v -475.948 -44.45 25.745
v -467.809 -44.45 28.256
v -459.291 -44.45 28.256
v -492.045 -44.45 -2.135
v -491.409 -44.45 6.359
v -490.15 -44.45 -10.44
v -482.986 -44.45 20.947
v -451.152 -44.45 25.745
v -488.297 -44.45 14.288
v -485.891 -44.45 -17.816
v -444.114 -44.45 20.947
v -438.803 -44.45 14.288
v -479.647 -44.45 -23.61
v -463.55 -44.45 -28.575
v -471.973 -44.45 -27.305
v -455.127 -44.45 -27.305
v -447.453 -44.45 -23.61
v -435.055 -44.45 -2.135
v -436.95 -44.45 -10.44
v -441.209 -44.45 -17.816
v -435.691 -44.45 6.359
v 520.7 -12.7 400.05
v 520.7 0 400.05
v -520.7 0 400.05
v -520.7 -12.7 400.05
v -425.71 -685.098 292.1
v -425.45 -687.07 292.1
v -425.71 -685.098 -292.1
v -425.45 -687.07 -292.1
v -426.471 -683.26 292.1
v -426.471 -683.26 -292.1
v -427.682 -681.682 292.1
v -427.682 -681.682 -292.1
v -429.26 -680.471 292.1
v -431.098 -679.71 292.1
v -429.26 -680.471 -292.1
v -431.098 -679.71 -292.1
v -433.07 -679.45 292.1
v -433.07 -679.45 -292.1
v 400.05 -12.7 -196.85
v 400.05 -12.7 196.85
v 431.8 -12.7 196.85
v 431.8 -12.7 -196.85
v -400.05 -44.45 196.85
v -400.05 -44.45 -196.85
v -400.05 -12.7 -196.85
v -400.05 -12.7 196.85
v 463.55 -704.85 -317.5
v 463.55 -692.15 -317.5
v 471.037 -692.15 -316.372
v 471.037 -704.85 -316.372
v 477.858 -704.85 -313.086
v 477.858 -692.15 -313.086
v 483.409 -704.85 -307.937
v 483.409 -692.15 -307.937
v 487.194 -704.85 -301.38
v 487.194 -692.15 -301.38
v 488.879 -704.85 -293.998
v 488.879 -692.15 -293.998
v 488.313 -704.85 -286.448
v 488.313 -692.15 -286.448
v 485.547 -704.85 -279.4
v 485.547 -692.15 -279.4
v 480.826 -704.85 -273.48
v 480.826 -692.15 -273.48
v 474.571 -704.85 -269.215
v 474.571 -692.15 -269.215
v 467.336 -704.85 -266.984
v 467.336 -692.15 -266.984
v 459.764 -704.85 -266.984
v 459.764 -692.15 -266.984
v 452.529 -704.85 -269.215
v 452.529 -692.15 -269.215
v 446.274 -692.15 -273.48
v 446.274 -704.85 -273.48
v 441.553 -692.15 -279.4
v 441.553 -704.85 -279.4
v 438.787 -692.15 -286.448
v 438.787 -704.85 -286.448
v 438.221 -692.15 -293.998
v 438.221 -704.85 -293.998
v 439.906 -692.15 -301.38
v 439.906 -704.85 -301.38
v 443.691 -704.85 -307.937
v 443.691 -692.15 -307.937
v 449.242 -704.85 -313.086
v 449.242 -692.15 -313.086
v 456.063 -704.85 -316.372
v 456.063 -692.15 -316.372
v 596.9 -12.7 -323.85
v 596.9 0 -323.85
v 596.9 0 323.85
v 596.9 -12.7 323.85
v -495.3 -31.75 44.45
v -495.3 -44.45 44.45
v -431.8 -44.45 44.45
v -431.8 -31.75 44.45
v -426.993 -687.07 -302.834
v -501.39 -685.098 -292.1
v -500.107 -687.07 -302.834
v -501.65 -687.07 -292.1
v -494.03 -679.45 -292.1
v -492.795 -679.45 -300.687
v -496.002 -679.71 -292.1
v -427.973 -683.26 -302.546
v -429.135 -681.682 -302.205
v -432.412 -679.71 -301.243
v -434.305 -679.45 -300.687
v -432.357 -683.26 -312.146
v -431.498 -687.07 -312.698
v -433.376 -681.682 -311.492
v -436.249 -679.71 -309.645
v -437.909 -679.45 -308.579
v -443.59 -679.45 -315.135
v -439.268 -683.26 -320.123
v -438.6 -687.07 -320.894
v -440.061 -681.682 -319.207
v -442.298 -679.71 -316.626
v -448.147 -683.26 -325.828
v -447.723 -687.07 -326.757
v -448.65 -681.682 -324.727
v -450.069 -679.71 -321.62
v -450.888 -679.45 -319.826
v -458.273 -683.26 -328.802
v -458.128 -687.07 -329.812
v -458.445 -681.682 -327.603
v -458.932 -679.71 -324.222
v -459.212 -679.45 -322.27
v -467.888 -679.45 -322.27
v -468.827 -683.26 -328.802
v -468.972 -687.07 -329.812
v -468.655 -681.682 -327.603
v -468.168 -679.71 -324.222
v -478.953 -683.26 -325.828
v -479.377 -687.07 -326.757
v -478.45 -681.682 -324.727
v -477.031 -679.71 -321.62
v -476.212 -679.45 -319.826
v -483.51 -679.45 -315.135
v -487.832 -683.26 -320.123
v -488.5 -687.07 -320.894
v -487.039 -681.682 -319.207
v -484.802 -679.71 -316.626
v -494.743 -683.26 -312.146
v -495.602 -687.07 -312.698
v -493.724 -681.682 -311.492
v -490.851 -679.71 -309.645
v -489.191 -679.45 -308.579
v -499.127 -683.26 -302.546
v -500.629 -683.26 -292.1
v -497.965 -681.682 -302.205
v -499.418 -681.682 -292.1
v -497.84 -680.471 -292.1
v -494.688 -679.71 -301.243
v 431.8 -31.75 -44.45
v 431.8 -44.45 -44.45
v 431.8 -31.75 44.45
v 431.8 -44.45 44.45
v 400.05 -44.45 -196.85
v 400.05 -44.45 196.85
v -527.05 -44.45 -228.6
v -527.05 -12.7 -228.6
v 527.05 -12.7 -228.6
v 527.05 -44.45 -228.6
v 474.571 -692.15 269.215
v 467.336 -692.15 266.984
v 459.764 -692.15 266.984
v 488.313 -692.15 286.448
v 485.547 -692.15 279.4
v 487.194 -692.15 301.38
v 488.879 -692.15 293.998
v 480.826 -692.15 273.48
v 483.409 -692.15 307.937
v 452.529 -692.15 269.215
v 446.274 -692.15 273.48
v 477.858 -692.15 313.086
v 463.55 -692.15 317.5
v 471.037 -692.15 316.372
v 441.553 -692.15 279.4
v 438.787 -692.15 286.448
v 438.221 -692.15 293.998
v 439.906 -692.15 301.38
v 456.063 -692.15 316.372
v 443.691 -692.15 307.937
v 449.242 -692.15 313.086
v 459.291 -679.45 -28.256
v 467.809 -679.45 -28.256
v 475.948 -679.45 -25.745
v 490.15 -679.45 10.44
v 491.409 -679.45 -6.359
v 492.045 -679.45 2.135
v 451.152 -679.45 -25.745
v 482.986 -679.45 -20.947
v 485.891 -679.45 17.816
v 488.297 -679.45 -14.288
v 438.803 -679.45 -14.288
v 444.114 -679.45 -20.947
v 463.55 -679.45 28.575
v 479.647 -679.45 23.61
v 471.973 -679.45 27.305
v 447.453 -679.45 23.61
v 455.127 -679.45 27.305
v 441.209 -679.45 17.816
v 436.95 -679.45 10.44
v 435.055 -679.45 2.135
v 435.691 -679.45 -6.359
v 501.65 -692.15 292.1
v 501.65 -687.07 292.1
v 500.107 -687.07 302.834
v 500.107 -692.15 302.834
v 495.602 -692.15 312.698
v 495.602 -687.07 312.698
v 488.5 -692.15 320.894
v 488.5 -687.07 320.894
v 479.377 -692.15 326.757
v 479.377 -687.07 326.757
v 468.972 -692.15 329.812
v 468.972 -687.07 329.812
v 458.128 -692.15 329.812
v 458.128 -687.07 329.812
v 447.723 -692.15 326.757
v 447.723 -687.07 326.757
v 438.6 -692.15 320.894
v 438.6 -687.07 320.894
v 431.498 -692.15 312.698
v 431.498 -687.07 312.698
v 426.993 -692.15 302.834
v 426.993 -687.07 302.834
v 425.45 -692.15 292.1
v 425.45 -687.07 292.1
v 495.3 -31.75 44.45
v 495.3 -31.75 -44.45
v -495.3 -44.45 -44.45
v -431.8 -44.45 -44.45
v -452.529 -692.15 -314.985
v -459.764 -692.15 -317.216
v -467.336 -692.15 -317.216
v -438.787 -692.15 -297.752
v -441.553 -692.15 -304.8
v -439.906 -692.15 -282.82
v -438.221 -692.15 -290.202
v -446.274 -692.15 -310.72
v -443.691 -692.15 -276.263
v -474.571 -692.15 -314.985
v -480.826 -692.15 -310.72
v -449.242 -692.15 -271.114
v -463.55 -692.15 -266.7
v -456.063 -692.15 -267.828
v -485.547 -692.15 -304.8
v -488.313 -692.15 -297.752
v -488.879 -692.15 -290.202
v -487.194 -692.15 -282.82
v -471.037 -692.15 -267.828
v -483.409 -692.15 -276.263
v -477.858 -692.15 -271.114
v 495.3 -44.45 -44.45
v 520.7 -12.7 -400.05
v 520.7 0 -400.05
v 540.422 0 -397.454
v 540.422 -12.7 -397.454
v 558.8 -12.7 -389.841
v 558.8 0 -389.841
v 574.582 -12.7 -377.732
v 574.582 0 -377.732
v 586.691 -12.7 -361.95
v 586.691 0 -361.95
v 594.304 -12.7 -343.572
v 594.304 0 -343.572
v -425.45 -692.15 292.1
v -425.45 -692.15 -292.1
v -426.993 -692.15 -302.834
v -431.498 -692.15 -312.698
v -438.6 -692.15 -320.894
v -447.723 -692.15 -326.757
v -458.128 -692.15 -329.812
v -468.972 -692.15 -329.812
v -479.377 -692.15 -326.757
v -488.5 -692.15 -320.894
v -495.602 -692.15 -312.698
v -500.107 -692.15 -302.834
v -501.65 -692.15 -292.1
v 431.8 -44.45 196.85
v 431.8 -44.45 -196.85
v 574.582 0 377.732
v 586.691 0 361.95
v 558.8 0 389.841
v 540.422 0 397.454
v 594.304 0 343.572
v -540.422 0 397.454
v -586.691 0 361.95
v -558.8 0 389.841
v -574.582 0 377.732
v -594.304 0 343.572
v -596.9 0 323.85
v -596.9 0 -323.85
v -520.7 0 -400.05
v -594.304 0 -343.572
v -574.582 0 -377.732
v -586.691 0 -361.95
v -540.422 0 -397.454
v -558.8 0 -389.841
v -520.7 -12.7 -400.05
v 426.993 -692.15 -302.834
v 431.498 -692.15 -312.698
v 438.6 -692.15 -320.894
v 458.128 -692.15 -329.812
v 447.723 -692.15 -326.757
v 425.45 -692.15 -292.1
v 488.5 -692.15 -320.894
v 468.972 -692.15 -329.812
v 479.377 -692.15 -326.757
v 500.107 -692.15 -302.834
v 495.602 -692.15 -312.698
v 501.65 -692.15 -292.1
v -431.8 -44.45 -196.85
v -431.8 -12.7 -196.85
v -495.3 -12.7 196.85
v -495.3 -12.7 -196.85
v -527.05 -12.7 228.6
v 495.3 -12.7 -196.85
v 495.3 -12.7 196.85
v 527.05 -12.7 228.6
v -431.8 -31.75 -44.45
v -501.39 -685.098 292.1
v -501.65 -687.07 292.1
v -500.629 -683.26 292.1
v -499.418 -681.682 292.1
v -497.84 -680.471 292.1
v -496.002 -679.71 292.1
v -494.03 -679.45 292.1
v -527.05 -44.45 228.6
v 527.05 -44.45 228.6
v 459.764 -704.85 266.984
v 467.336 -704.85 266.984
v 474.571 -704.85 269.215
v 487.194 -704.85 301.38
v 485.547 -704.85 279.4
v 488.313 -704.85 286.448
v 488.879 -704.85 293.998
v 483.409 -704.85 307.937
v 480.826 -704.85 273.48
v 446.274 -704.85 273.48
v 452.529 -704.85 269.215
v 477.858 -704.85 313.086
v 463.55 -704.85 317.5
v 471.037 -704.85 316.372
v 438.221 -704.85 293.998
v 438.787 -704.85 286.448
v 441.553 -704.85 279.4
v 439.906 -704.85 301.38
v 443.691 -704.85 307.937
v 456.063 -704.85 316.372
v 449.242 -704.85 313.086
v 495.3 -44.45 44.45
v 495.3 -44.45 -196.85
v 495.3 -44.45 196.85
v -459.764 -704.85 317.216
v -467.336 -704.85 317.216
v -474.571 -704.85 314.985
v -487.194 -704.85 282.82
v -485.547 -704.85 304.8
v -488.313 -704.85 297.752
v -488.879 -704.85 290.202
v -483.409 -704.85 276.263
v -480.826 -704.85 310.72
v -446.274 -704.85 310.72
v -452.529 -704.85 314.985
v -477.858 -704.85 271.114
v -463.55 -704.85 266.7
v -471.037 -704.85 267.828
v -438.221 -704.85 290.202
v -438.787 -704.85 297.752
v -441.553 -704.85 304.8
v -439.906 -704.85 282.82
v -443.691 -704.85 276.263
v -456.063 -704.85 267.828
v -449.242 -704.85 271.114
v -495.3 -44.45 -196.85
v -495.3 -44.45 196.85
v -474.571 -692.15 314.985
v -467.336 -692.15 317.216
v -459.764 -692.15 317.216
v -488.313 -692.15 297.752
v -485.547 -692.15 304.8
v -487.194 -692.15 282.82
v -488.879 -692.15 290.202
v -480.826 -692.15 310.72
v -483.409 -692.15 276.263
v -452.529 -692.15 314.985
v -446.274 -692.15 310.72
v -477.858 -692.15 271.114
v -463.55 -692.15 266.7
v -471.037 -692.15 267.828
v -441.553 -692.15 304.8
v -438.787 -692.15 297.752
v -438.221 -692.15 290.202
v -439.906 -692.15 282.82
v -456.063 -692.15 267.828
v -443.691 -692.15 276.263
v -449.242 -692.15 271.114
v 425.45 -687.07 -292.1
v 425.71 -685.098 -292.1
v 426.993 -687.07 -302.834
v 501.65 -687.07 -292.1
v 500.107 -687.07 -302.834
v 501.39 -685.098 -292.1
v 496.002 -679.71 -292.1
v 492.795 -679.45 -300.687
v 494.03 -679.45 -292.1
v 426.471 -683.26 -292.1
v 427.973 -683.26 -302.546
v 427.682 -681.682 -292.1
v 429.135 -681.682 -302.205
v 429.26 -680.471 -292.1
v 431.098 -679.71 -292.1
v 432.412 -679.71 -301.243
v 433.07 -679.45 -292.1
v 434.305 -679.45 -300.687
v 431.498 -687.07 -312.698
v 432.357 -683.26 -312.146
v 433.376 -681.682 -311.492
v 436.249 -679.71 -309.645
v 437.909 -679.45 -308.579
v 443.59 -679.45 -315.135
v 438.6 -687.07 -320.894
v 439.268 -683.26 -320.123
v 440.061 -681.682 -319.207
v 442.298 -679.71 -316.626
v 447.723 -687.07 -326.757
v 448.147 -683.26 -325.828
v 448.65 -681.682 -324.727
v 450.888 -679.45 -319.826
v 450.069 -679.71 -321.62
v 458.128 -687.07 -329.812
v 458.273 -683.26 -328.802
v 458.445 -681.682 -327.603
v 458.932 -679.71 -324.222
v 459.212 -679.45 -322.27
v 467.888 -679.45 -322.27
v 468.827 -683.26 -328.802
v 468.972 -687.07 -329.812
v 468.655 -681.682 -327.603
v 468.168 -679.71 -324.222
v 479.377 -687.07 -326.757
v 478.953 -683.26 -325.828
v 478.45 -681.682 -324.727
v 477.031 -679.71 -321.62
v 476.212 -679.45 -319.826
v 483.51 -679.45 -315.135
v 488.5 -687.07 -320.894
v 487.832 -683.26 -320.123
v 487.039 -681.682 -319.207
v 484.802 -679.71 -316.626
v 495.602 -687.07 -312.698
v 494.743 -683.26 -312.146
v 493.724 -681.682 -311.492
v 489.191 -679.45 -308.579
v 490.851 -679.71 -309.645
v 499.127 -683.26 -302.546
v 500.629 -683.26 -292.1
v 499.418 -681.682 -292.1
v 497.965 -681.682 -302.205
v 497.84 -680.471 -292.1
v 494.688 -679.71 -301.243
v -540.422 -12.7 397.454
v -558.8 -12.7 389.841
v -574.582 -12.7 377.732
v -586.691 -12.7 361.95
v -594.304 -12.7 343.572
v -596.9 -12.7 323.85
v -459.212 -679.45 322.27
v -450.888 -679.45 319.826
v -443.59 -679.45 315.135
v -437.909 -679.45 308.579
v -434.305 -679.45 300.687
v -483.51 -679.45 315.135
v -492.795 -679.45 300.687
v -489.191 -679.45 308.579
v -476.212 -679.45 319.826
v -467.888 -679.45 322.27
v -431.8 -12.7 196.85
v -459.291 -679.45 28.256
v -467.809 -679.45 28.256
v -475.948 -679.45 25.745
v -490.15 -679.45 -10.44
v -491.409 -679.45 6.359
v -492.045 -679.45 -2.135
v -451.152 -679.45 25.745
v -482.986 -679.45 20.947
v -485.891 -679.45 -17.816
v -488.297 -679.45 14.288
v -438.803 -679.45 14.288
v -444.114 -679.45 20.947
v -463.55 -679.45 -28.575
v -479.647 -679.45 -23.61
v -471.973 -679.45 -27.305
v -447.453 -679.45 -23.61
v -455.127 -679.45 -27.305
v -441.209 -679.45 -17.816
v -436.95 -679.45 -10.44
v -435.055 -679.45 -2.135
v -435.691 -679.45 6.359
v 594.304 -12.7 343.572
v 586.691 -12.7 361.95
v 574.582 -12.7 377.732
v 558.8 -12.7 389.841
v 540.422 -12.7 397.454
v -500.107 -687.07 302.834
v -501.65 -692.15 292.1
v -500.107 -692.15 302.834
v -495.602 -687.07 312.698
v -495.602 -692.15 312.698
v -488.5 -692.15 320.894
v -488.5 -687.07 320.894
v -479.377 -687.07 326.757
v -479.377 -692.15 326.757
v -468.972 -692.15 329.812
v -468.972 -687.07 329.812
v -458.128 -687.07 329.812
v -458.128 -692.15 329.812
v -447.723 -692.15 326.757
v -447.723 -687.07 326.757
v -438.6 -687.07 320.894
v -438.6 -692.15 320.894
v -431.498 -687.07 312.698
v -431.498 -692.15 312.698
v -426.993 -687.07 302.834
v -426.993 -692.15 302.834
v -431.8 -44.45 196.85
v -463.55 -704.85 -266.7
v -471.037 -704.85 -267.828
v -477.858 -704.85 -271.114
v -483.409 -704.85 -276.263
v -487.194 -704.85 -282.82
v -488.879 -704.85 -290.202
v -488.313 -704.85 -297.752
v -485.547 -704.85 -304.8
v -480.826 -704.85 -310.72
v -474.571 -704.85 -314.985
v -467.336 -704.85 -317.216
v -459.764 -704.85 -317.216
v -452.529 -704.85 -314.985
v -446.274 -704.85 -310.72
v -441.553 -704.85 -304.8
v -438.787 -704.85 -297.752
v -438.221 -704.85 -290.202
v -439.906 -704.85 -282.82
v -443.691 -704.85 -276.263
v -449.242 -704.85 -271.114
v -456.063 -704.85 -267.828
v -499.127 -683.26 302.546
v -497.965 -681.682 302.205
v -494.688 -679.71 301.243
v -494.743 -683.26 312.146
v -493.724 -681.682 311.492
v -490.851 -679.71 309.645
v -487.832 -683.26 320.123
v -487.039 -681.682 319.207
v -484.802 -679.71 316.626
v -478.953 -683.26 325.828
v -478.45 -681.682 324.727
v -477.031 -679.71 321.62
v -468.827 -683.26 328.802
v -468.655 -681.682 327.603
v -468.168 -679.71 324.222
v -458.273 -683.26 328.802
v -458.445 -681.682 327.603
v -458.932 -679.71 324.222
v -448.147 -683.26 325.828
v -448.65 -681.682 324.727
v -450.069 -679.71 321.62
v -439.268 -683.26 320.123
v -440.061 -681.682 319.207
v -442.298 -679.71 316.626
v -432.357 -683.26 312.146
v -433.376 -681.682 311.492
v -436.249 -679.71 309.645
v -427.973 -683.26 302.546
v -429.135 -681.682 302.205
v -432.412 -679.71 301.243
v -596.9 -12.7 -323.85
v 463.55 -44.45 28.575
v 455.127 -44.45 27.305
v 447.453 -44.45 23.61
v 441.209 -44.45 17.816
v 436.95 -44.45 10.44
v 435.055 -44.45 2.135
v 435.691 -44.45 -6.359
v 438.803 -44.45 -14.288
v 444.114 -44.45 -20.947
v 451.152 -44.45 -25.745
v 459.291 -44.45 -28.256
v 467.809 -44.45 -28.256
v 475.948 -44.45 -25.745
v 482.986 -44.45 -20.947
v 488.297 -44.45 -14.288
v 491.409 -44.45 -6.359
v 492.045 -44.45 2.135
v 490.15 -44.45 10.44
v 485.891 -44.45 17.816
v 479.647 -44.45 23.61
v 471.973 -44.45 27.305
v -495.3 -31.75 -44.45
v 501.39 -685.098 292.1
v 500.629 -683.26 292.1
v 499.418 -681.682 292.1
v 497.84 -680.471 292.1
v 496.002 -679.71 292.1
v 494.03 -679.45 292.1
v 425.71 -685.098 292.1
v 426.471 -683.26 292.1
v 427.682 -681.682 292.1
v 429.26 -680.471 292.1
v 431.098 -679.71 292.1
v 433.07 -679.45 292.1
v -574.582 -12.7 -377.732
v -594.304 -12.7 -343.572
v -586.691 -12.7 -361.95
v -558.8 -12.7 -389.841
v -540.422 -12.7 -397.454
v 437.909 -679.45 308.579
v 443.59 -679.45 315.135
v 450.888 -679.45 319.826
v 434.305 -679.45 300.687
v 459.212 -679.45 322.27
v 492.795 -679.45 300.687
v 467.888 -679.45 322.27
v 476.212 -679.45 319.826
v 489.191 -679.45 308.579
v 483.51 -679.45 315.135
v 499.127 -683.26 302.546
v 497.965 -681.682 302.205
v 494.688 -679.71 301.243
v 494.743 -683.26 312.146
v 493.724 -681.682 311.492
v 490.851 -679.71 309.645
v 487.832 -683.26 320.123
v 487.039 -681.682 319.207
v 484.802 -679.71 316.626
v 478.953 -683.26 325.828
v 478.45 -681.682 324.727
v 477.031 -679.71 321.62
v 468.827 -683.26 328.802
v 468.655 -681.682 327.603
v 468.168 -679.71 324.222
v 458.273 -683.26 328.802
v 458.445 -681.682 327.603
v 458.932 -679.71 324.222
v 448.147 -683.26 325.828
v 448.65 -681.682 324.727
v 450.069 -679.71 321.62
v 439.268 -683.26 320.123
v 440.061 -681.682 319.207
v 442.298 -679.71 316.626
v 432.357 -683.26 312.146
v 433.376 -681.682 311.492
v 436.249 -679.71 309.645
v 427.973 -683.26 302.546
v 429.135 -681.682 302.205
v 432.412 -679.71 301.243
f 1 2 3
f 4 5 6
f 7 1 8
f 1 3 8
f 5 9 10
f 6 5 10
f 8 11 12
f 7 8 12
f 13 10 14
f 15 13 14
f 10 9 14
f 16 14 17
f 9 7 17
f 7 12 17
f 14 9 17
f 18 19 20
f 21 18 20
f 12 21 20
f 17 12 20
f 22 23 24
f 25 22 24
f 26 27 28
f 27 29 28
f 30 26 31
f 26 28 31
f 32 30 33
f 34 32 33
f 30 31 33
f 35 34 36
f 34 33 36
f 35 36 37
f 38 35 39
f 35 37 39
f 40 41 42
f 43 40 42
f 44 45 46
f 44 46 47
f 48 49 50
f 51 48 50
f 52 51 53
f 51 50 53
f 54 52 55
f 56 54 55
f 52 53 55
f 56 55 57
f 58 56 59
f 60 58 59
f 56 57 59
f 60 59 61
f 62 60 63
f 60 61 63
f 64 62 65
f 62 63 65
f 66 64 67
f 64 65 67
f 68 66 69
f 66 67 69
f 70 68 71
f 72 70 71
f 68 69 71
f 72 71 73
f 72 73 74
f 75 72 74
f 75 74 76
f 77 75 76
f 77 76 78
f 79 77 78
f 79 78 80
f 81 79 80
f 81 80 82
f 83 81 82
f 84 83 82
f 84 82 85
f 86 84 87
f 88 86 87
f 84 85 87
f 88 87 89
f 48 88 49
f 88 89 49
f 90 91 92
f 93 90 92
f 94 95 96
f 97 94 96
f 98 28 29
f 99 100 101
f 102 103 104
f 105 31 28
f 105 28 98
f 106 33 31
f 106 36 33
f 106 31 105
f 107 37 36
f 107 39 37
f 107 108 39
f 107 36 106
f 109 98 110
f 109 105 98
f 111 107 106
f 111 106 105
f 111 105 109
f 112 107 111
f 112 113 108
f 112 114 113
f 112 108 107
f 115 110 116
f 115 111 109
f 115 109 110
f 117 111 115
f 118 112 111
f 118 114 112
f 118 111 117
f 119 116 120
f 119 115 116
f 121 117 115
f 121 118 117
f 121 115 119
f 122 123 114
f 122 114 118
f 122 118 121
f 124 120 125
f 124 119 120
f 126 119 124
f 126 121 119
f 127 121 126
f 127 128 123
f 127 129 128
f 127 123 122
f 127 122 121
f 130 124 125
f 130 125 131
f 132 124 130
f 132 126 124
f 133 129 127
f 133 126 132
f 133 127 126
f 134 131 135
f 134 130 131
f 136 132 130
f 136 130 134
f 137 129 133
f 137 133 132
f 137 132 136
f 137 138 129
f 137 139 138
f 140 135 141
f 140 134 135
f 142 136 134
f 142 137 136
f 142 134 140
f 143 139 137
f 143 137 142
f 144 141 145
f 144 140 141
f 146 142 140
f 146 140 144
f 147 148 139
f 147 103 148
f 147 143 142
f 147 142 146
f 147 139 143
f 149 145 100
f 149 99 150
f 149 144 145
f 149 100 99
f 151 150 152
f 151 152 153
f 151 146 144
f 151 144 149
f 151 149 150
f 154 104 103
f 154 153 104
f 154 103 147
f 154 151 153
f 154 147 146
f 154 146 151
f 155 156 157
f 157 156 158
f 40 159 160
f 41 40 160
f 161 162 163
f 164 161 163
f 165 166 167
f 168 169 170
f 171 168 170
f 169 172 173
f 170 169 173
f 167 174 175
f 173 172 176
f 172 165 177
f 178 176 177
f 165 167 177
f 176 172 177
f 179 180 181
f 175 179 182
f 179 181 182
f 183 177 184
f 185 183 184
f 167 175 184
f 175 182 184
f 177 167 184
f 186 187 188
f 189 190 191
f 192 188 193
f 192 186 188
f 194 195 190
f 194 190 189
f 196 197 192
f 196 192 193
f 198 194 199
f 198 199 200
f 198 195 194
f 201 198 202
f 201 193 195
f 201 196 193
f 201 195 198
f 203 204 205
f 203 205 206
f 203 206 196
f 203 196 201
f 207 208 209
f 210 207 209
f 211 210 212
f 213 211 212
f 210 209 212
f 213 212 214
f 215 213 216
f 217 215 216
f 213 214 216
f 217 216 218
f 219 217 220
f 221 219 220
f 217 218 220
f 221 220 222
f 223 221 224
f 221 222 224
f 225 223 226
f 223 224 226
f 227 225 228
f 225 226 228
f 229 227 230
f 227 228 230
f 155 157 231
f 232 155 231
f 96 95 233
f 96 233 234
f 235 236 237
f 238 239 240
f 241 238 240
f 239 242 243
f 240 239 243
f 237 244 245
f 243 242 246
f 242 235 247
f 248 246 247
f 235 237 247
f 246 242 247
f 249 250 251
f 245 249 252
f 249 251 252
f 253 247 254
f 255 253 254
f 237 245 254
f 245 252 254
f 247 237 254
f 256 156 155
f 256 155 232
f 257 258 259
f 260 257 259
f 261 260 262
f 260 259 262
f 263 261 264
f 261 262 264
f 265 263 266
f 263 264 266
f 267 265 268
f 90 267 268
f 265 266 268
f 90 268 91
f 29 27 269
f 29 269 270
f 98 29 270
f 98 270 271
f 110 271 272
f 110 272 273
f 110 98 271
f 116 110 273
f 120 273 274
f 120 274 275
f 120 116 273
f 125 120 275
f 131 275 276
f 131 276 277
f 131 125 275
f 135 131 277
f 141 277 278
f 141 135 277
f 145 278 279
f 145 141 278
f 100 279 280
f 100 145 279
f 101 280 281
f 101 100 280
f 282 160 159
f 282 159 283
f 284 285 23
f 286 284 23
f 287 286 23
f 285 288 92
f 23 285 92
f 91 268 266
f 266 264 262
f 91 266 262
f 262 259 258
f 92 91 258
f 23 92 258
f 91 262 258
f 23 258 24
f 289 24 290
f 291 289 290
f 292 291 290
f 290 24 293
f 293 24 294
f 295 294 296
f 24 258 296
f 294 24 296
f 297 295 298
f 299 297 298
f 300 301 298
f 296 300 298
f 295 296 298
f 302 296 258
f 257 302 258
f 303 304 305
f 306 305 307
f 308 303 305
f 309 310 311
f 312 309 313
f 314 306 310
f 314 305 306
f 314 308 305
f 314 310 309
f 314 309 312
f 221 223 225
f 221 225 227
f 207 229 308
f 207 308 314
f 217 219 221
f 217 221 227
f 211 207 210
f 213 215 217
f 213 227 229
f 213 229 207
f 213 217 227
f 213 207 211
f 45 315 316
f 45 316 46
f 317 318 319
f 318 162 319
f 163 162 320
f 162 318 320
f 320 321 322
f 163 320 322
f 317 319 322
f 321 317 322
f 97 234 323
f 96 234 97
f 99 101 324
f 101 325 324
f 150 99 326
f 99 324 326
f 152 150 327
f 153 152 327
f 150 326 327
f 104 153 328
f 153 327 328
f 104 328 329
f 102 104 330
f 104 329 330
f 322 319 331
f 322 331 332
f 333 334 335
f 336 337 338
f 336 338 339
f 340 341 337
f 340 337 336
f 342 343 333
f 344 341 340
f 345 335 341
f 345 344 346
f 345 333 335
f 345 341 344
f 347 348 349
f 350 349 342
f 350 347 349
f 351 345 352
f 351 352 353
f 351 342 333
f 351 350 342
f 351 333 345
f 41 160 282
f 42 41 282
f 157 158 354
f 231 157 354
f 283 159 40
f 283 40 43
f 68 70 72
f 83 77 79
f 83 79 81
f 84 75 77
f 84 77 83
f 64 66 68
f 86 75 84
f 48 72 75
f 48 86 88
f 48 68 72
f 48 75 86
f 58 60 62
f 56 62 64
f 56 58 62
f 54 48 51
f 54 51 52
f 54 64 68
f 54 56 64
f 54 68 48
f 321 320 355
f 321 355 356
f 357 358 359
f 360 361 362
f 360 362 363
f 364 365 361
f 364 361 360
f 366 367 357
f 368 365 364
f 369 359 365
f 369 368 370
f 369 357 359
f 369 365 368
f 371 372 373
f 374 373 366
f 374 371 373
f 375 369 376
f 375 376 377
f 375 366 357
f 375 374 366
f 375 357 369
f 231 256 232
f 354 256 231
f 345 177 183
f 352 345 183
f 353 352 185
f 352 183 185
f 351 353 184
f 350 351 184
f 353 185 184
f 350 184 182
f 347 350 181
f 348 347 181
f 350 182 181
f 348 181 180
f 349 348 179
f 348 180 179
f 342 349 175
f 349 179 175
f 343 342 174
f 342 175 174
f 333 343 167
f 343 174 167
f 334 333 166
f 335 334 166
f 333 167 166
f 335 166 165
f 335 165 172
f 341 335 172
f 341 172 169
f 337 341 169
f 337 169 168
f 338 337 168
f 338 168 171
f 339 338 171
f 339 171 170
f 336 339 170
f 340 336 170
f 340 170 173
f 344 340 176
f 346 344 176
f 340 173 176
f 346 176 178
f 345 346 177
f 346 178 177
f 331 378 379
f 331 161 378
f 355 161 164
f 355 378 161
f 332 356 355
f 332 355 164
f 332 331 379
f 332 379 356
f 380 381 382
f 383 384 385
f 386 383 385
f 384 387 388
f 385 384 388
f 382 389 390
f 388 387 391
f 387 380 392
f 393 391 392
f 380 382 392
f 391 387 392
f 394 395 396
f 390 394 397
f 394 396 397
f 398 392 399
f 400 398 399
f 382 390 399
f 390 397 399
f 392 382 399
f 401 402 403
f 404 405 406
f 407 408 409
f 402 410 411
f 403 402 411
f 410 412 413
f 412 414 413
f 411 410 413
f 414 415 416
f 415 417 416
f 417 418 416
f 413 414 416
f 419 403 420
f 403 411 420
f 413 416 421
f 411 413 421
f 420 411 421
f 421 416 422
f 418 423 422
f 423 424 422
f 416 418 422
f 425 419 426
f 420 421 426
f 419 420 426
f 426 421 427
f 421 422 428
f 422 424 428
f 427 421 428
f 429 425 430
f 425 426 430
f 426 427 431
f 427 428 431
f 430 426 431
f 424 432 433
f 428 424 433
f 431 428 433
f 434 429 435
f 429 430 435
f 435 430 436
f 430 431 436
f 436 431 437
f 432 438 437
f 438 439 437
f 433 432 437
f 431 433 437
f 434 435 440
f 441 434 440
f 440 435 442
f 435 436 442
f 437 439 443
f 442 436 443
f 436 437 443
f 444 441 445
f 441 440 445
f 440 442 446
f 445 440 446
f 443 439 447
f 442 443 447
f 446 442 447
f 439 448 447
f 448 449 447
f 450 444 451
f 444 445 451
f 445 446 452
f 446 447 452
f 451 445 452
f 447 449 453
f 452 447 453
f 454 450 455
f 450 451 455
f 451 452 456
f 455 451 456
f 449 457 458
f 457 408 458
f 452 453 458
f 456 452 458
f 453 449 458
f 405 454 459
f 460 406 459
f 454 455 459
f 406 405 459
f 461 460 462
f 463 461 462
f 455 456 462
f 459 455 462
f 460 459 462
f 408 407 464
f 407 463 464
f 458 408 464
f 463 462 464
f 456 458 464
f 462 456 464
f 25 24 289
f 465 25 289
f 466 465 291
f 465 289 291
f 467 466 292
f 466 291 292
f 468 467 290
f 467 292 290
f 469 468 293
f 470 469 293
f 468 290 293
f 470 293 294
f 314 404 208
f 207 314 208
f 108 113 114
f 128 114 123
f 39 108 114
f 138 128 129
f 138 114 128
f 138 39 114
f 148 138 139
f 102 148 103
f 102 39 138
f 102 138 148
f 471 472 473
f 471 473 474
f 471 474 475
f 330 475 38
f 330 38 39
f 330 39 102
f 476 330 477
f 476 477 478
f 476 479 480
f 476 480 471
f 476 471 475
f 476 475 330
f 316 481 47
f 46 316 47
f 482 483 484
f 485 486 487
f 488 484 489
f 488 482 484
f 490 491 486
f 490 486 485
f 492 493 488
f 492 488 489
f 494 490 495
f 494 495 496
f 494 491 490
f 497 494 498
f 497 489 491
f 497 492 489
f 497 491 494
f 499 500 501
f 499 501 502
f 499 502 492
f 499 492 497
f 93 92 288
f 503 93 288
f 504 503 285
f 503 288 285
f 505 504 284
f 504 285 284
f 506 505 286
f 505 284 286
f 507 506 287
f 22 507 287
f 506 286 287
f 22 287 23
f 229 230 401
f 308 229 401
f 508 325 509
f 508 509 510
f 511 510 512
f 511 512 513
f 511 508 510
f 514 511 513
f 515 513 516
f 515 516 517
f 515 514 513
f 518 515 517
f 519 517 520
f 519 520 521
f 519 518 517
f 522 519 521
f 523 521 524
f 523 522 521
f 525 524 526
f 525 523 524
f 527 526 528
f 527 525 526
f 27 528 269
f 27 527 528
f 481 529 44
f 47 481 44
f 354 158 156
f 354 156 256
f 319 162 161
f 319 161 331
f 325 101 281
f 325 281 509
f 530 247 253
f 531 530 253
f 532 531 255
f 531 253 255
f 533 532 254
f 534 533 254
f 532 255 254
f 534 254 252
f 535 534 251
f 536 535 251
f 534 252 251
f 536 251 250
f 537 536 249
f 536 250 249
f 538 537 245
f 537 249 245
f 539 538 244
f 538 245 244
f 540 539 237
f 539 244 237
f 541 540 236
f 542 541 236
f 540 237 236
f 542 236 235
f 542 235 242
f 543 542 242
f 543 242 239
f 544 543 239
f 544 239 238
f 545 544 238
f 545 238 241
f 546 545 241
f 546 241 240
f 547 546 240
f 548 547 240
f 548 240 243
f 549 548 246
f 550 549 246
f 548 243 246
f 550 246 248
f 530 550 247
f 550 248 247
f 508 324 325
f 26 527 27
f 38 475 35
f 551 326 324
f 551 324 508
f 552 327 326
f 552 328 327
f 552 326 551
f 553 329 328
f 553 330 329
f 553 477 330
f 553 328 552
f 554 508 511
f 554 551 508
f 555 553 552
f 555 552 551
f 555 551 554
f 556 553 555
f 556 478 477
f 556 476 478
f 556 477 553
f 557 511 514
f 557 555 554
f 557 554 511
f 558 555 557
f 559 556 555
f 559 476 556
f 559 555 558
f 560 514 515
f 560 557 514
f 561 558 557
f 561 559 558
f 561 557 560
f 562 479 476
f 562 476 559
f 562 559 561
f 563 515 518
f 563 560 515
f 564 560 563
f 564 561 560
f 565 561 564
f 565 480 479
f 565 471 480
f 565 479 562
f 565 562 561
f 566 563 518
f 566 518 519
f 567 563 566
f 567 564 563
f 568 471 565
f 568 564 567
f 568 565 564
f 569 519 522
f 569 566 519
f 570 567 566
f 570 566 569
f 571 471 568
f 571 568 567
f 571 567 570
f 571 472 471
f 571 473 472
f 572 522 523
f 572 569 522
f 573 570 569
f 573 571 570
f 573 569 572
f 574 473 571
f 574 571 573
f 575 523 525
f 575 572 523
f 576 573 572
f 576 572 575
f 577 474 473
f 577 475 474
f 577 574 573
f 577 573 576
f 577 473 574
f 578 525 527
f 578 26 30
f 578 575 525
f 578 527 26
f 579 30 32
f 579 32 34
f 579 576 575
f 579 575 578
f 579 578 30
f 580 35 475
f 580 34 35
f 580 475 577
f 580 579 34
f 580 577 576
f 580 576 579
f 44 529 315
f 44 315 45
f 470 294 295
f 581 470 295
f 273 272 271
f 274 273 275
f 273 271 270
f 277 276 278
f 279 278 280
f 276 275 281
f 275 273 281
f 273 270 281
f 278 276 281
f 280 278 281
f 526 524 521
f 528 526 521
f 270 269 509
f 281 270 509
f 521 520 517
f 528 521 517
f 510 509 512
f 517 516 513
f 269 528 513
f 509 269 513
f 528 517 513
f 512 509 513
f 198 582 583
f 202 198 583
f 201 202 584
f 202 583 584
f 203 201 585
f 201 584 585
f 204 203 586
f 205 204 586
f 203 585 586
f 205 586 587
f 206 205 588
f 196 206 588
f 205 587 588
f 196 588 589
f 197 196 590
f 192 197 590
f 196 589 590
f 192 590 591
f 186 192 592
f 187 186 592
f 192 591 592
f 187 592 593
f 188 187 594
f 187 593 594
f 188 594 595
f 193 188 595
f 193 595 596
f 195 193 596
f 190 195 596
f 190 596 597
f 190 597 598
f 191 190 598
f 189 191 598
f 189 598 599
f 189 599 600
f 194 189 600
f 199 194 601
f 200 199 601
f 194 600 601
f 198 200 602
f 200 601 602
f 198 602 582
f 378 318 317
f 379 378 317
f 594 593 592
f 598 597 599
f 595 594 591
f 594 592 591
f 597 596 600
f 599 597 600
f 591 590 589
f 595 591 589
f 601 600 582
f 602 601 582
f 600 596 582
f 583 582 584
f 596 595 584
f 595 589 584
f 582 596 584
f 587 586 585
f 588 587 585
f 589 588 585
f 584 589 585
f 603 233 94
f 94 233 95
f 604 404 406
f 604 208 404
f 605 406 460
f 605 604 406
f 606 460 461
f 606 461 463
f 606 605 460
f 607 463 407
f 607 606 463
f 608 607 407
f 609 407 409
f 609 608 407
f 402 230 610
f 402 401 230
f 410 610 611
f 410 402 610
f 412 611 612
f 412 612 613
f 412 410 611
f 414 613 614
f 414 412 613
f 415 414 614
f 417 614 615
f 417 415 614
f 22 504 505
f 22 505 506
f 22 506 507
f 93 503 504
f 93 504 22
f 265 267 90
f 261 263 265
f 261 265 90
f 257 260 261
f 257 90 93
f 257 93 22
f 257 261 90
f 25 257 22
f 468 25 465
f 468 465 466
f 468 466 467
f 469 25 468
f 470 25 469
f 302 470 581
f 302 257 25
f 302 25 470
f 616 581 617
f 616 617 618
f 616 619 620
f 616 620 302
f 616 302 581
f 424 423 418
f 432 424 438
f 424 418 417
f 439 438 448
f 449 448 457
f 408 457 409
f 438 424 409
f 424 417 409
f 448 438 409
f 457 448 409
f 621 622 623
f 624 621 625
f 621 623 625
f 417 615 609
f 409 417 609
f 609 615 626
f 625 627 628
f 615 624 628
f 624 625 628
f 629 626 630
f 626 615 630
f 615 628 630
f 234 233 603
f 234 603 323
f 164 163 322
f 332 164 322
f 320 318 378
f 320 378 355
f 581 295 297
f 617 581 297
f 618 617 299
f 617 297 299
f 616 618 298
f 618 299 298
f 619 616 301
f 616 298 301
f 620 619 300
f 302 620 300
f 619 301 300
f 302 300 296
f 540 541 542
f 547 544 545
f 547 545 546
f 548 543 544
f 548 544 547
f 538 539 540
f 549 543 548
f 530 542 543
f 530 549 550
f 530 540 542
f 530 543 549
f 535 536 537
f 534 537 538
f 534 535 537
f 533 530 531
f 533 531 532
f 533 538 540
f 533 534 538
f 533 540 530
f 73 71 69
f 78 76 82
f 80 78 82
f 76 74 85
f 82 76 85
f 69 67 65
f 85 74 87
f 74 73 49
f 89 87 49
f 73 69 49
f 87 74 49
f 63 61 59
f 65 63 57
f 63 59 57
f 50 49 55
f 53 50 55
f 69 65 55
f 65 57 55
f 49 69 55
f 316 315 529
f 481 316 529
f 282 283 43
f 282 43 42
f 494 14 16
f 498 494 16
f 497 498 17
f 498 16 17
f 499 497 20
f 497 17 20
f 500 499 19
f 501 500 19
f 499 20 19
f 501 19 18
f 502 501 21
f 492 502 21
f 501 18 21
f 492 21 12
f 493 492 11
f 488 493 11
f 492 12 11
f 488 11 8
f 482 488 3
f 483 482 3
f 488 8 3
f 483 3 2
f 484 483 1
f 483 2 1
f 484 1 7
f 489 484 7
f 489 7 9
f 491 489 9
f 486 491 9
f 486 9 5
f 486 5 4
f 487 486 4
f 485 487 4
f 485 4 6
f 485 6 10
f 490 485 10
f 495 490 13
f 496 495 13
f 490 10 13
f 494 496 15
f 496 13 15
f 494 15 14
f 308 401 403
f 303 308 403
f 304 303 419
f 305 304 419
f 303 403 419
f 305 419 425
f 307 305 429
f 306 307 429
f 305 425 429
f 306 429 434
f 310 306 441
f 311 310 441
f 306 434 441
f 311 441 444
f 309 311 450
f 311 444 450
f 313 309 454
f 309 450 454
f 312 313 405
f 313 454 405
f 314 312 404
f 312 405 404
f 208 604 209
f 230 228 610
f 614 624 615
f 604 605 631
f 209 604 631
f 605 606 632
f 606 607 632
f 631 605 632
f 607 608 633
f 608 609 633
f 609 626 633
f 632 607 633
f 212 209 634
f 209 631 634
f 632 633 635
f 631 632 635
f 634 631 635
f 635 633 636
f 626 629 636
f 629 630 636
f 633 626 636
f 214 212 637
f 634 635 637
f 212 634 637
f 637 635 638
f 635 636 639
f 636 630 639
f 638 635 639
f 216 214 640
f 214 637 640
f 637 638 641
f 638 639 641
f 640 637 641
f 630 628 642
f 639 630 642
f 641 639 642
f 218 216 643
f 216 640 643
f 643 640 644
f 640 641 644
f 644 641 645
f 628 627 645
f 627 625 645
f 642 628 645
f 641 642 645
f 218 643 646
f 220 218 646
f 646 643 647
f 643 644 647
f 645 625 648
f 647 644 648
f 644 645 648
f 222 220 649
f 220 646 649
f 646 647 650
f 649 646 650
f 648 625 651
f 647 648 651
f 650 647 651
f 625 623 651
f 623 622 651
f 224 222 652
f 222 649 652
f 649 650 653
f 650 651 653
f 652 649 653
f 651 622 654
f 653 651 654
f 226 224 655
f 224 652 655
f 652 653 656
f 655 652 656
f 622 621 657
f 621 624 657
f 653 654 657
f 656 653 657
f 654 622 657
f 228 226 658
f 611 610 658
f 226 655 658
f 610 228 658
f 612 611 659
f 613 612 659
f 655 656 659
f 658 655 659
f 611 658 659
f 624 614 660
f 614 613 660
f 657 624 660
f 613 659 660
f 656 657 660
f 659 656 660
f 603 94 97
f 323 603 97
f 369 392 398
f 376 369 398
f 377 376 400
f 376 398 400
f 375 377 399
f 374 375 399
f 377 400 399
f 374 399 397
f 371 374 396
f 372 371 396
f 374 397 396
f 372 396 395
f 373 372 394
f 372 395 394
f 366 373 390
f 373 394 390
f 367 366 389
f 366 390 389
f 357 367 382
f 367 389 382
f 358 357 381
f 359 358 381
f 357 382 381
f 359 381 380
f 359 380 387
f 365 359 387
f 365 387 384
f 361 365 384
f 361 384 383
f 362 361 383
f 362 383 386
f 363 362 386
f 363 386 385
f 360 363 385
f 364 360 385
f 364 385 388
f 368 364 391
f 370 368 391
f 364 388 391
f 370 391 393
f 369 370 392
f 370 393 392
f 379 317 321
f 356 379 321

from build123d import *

# Parameters (mm, degrees)
BOSS_EXTRUDE1_DEPTH   = 12.7
SKETCH2_W             = 1054.1
SKETCH2_H             = 457.2
SKETCH2_W_2           = 990.6
SKETCH2_H_2           = 393.7
EXTRUDE_THIN1_DEPTH   = 31.75
SKETCH3_W             = 31.75
SKETCH3_H             = 393.7
BOSS_EXTRUDE3_DEPTH   = 31.75
BOSS_EXTRUDE3_2_DEPTH = 31.75
SKETCH4_W             = 63.5
SKETCH4_H             = 88.9
BOSS_EXTRUDE4_DEPTH   = 12.7
BOSS_EXTRUDE4_2_DEPTH = 12.7
SKETCH5_R             = 28.575
BOSS_EXTRUDE5_DEPTH   = 635
BOSS_EXTRUDE5_2_DEPTH = 635
BOSS_EXTRUDE6_DEPTH   = 12.7
BOSS_EXTRUDE6_2_DEPTH = 12.7
SKETCH7_R             = 25.4
BOSS_EXTRUDE7_DEPTH   = 12.7
BOSS_EXTRUDE7_2_DEPTH = 12.7
BOSS_EXTRUDE7_3_DEPTH = 12.7
BOSS_EXTRUDE7_4_DEPTH = 12.7
FILLET1_R             = 7.62
FILLET2_R             = 7.62


with BuildPart() as part:
    # Sketch1 → Boss-Extrude1 (new body)
    with BuildSketch(Plane(origin=(0, 0, 0), x_dir=(1, 0, 0), z_dir=(0, 1, 0))):
        with BuildLine():
            Line((-520.7, 400.05), (520.7, 400.05))
            ThreePointArc((520.7, 400.05), (574.581536726, 377.731536726), (596.9, 323.85))
            Line((596.9, 323.85), (596.9, -323.85))
            ThreePointArc((596.9, -323.85), (574.581536726, -377.731536726), (520.7, -400.05))
            Line((520.7, -400.05), (-520.7, -400.05))
            ThreePointArc((-520.7, -400.05), (-574.581536726, -377.731536726), (-596.9, -323.85))
            Line((-596.9, -323.85), (-596.9, 323.85))
            ThreePointArc((-596.9, 323.85), (-574.581536726, 377.731536726), (-520.7, 400.05))
        make_face()
    extrude(amount=-BOSS_EXTRUDE1_DEPTH)


with BuildPart() as body_2:
    # Sketch2 → Extrude-Thin1 (new body)
    with BuildSketch(Plane.XZ.offset(12.7)):
        Rectangle(SKETCH2_W, SKETCH2_H)
        Rectangle(SKETCH2_W_2, SKETCH2_H_2, mode=Mode.SUBTRACT)
    extrude(amount=EXTRUDE_THIN1_DEPTH)


with BuildPart() as body_3:
    # Sketch3 → Boss-Extrude3 (new body)
    with BuildSketch(Plane.XZ.offset(44.45)):
        with Locations((-415.925, 0)):
            Rectangle(SKETCH3_W, SKETCH3_H)
    extrude(amount=-BOSS_EXTRUDE3_DEPTH)


with BuildPart() as body_4:
    # Sketch3 → Boss-Extrude3 2 (new body)
    with BuildSketch(Plane.XZ.offset(44.45)):
        with Locations((415.925, 0)):
            Rectangle(SKETCH3_W, SKETCH3_H)
    extrude(amount=-BOSS_EXTRUDE3_2_DEPTH)


with BuildPart() as body_5:
    # Sketch4 → Boss-Extrude4 (new body)
    with BuildSketch(Plane.XZ.offset(44.45)):
        with Locations((-463.55, 0)):
            Rectangle(SKETCH4_W, SKETCH4_H)
    extrude(amount=-BOSS_EXTRUDE4_DEPTH)


with BuildPart() as body_6:
    # Sketch4 → Boss-Extrude4 2 (new body)
    with BuildSketch(Plane.XZ.offset(44.45)):
        with Locations((463.55, 0)):
            Rectangle(SKETCH4_W, SKETCH4_H)
    extrude(amount=-BOSS_EXTRUDE4_2_DEPTH)


with BuildPart() as body_7:
    # Sketch5 → Boss-Extrude5 (new body)
    with BuildSketch(Plane.XZ.offset(44.45)):
        with Locations(Location((-463.55, 0, 0), (0, 0, 270))):  # turned: the seam where the file's is
            Circle(SKETCH5_R)
    extrude(amount=BOSS_EXTRUDE5_DEPTH)


with BuildPart() as body_8:
    # Sketch5 → Boss-Extrude5 2 (new body)
    with BuildSketch(Plane.XZ.offset(44.45)):
        with Locations(Location((463.55, 0, 0), (0, 0, 90))):  # turned: the seam where the file's is
            Circle(SKETCH5_R)
    extrude(amount=BOSS_EXTRUDE5_2_DEPTH)


with BuildPart() as body_9:
    # Sketch6 → Boss-Extrude6 (new body)
    with BuildSketch(Plane.XZ.offset(679.45)):
        with BuildLine():
            Line((-501.65, -292.1), (-501.65, 292.1))
            ThreePointArc((-501.65, 292.1), (-463.55, 330.2), (-425.45, 292.1))
            Line((-425.45, 292.1), (-425.45, -292.1))
            ThreePointArc((-425.45, -292.1), (-463.55, -330.2), (-501.65, -292.1))
        make_face()
    extrude(amount=BOSS_EXTRUDE6_DEPTH)

    # Fillet1
    fillet1_edges = [body_9.edges().sort_by_distance(p)[0] for p in [
        (-501.65, -679.45, 0),
        (-463.55, -679.45, 330.2),
        (-425.45, -679.45, 0),
        (-463.55, -679.45, -330.2),
    ]]
    fillet(fillet1_edges, radius=FILLET1_R)


with BuildPart() as body_10:
    # Sketch6 → Boss-Extrude6 2 (new body)
    with BuildSketch(Plane.XZ.offset(679.45)):
        with BuildLine():
            Line((501.65, -292.1), (501.65, 292.1))
            ThreePointArc((501.65, 292.1), (463.55, 330.2), (425.45, 292.1))
            Line((425.45, 292.1), (425.45, -292.1))
            ThreePointArc((425.45, -292.1), (463.55, -330.2), (501.65, -292.1))
        make_face()
    extrude(amount=BOSS_EXTRUDE6_2_DEPTH)

    # Fillet2
    fillet2_edges = [body_10.edges().sort_by_distance(p)[0] for p in [
        (425.45, -679.45, 0),
        (463.55, -679.45, 330.2),
        (501.65, -679.45, 0),
        (463.55, -679.45, -330.2),
    ]]
    fillet(fillet2_edges, radius=FILLET2_R)


with BuildPart() as body_11:
    # Sketch7 → Boss-Extrude7 (new body)
    with BuildSketch(Plane.XZ.offset(692.15)):
        with Locations(Location((-463.55, 292.1, 0), (0, 0, 270))):  # turned: the seam where the file's is
            Circle(SKETCH7_R)
    extrude(amount=BOSS_EXTRUDE7_DEPTH)


with BuildPart() as body_12:
    # Sketch7 → Boss-Extrude7 2 (new body)
    with BuildSketch(Plane.XZ.offset(692.15)):
        with Locations(Location((463.55, 292.1, 0), (0, 0, 90))):  # turned: the seam where the file's is
            Circle(SKETCH7_R)
    extrude(amount=BOSS_EXTRUDE7_2_DEPTH)


with BuildPart() as body_13:
    # Sketch7 → Boss-Extrude7 3 (new body)
    with BuildSketch(Plane.XZ.offset(692.15)):
        with Locations(Location((463.55, -292.1, 0), (0, 0, 270))):  # turned: the seam where the file's is
            Circle(SKETCH7_R)
    extrude(amount=BOSS_EXTRUDE7_3_DEPTH)


with BuildPart() as body_14:
    # Sketch7 → Boss-Extrude7 4 (new body)
    with BuildSketch(Plane.XZ.offset(692.15)):
        with Locations(Location((-463.55, -292.1, 0), (0, 0, 90))):  # turned: the seam where the file's is
            Circle(SKETCH7_R)
    extrude(amount=BOSS_EXTRUDE7_4_DEPTH)


solid = Compound([part.part, body_2.part, body_3.part, body_4.part, body_5.part, body_6.part, body_7.part, body_8.part, body_9.part, body_10.part, body_11.part, body_12.part, body_13.part, body_14.part])
